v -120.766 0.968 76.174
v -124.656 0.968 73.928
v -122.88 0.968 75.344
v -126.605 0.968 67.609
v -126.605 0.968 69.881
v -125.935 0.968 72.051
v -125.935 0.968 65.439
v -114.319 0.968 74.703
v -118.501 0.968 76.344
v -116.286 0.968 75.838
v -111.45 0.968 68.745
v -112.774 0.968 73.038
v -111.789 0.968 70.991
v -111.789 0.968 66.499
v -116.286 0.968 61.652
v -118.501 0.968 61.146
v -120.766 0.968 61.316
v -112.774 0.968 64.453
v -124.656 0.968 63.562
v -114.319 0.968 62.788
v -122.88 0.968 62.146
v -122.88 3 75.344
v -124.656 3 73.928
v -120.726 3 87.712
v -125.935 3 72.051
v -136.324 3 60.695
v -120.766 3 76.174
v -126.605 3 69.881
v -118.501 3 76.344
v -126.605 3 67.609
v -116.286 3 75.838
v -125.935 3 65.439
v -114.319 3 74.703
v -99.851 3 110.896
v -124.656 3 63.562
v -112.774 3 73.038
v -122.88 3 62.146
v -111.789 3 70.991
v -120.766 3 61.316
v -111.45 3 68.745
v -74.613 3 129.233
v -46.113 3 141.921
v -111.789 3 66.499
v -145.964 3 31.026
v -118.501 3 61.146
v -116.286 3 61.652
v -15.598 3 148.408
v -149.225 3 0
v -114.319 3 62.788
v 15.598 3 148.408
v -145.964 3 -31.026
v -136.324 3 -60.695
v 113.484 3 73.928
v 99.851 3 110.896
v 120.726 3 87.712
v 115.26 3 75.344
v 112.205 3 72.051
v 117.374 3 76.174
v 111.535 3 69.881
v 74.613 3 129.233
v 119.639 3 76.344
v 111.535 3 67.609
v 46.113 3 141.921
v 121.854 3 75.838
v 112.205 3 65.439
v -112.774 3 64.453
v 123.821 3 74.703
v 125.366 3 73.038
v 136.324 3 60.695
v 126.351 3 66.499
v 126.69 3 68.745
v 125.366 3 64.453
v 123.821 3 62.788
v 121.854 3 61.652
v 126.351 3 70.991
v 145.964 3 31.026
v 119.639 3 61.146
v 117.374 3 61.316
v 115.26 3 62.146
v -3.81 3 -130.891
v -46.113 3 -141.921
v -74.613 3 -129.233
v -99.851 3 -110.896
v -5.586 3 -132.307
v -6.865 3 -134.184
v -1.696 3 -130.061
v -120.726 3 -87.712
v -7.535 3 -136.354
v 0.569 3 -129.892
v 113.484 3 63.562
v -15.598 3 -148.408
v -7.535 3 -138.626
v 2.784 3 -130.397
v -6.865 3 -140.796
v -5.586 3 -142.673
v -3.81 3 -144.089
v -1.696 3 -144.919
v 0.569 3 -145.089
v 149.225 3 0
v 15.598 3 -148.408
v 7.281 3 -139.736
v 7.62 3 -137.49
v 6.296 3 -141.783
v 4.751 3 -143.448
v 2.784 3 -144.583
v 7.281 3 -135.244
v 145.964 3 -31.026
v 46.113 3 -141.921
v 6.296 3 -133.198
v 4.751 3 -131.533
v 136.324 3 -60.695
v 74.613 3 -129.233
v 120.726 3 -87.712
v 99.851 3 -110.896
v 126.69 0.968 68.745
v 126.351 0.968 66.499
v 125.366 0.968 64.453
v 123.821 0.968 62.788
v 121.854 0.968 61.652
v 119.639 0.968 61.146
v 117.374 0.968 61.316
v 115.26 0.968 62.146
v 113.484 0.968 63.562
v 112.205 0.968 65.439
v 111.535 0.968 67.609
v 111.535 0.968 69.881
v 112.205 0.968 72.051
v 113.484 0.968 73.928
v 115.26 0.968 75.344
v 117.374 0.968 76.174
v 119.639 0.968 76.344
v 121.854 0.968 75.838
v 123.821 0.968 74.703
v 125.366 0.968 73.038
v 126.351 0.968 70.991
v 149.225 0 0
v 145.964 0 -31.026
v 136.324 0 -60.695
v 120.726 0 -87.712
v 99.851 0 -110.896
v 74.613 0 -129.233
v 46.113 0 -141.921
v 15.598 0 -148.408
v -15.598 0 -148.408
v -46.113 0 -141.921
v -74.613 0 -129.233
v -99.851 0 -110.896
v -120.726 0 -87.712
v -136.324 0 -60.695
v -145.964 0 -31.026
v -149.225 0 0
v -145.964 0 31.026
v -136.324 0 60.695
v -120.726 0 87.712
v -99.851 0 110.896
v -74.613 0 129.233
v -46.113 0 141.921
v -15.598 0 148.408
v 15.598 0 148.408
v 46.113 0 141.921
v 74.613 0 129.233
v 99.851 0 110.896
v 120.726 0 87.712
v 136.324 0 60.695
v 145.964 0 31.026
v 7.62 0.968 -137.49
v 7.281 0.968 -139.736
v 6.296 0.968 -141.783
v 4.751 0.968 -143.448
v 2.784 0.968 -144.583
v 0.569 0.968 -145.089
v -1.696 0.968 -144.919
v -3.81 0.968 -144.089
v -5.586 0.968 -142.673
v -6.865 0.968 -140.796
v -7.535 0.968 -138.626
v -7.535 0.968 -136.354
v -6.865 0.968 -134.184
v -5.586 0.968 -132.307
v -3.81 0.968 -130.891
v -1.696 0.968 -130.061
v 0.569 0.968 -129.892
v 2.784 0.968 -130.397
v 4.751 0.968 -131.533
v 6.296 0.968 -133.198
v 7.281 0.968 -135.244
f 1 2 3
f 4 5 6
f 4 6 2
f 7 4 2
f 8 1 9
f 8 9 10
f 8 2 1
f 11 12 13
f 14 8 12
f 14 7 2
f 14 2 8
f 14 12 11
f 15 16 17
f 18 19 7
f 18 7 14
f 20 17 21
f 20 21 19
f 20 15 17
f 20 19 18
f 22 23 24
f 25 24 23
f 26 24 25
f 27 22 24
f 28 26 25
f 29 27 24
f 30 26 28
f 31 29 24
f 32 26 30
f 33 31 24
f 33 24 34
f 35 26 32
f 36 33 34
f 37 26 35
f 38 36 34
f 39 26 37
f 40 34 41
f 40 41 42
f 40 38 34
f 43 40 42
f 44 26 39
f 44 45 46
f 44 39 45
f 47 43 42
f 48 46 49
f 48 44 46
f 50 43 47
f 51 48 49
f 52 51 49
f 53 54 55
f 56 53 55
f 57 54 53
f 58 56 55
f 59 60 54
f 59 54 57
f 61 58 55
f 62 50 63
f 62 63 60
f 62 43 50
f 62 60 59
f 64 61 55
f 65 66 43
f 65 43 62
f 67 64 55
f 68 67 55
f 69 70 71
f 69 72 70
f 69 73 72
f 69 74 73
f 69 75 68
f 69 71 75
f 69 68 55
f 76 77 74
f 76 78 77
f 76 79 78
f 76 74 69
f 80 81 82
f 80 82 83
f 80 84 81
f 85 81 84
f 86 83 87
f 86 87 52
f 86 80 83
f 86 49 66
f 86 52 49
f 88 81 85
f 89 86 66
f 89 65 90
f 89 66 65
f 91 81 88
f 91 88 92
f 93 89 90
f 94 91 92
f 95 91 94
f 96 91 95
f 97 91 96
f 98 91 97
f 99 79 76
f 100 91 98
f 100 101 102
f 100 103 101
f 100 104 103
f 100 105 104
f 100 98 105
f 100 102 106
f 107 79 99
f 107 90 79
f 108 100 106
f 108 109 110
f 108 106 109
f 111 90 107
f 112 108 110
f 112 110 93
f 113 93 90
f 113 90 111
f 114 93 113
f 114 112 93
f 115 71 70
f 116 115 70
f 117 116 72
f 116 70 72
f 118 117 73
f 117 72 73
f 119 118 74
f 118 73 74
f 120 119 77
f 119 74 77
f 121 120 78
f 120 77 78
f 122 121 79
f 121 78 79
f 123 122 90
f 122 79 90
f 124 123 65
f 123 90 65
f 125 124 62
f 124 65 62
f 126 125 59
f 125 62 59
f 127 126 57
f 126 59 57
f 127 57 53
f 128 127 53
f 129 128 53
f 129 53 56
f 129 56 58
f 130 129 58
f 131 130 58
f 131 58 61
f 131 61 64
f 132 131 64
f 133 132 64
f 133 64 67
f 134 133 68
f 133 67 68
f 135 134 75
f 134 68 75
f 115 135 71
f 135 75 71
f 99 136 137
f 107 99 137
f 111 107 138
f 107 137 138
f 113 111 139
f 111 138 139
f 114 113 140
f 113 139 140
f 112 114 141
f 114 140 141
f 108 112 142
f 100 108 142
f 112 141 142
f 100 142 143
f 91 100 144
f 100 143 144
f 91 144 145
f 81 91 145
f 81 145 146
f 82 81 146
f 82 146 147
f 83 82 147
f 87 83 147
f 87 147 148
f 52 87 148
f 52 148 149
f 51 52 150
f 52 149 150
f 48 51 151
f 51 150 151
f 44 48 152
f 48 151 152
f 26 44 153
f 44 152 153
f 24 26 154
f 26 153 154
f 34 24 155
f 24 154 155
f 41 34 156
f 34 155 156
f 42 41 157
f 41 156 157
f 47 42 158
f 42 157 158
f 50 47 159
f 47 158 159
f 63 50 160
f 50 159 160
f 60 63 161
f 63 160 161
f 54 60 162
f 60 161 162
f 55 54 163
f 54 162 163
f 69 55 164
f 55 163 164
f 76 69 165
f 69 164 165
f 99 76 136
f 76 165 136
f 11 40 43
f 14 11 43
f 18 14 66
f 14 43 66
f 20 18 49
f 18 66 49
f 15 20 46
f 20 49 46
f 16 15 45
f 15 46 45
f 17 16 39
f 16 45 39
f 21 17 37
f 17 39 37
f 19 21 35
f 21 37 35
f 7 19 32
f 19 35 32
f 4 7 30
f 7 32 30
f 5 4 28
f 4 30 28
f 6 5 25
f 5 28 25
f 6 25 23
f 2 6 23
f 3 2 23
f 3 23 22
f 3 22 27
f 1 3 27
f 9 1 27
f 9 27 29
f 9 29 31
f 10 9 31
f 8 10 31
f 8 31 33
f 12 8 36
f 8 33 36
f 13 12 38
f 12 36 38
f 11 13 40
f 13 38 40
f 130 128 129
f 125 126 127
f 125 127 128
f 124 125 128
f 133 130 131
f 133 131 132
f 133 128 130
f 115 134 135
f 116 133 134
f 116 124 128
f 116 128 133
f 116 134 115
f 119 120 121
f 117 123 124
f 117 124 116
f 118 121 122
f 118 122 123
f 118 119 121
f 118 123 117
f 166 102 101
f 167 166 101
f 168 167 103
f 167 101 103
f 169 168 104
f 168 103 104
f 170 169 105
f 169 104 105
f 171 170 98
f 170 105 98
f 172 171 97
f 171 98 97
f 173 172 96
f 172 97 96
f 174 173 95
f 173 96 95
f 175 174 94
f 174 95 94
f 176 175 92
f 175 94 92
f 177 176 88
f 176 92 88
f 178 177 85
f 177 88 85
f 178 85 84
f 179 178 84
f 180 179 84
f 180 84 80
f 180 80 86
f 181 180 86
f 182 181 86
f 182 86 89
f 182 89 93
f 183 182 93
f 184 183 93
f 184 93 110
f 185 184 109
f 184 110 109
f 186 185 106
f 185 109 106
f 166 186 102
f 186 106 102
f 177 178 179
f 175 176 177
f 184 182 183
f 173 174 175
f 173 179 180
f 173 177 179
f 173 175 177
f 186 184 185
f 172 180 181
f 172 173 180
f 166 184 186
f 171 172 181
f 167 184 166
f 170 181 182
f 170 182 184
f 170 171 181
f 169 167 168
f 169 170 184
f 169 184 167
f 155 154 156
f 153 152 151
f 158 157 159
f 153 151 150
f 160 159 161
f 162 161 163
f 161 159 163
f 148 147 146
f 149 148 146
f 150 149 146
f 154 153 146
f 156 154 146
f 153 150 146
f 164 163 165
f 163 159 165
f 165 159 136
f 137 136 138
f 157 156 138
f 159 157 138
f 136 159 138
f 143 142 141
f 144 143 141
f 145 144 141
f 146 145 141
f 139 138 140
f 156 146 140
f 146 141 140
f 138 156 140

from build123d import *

# Parameters (mm, degrees)
SKETCH1_R           = 149.225
BOSS_EXTRUDE1_DEPTH = 3
SKETCH2_R           = 7.62
CUT_EXTRUDE1_DEPTH  = 2.032


with BuildPart() as part:
    # Sketch1 → Boss-Extrude1 (new body)
    with BuildSketch(Plane(origin=(0, 0, 0), x_dir=(1, 0, 0), z_dir=(0, 1, 0))):
        Circle(SKETCH1_R)
    extrude(amount=BOSS_EXTRUDE1_DEPTH)

    # Sketch2 → Cut-Extrude1 (cut)
    with BuildSketch(Plane(origin=(0, 3, 0), x_dir=(1, 0, 0), z_dir=(0, 1, 0))):
        with Locations((0, 137.4902)):
            Circle(SKETCH2_R)
        with Locations((119.070005971, -68.7451)):
            Circle(SKETCH2_R)
        with Locations((-119.070005971, -68.7451)):
            Circle(SKETCH2_R)
    extrude(amount=-CUT_EXTRUDE1_DEPTH, mode=Mode.SUBTRACT)


solid = part.part
